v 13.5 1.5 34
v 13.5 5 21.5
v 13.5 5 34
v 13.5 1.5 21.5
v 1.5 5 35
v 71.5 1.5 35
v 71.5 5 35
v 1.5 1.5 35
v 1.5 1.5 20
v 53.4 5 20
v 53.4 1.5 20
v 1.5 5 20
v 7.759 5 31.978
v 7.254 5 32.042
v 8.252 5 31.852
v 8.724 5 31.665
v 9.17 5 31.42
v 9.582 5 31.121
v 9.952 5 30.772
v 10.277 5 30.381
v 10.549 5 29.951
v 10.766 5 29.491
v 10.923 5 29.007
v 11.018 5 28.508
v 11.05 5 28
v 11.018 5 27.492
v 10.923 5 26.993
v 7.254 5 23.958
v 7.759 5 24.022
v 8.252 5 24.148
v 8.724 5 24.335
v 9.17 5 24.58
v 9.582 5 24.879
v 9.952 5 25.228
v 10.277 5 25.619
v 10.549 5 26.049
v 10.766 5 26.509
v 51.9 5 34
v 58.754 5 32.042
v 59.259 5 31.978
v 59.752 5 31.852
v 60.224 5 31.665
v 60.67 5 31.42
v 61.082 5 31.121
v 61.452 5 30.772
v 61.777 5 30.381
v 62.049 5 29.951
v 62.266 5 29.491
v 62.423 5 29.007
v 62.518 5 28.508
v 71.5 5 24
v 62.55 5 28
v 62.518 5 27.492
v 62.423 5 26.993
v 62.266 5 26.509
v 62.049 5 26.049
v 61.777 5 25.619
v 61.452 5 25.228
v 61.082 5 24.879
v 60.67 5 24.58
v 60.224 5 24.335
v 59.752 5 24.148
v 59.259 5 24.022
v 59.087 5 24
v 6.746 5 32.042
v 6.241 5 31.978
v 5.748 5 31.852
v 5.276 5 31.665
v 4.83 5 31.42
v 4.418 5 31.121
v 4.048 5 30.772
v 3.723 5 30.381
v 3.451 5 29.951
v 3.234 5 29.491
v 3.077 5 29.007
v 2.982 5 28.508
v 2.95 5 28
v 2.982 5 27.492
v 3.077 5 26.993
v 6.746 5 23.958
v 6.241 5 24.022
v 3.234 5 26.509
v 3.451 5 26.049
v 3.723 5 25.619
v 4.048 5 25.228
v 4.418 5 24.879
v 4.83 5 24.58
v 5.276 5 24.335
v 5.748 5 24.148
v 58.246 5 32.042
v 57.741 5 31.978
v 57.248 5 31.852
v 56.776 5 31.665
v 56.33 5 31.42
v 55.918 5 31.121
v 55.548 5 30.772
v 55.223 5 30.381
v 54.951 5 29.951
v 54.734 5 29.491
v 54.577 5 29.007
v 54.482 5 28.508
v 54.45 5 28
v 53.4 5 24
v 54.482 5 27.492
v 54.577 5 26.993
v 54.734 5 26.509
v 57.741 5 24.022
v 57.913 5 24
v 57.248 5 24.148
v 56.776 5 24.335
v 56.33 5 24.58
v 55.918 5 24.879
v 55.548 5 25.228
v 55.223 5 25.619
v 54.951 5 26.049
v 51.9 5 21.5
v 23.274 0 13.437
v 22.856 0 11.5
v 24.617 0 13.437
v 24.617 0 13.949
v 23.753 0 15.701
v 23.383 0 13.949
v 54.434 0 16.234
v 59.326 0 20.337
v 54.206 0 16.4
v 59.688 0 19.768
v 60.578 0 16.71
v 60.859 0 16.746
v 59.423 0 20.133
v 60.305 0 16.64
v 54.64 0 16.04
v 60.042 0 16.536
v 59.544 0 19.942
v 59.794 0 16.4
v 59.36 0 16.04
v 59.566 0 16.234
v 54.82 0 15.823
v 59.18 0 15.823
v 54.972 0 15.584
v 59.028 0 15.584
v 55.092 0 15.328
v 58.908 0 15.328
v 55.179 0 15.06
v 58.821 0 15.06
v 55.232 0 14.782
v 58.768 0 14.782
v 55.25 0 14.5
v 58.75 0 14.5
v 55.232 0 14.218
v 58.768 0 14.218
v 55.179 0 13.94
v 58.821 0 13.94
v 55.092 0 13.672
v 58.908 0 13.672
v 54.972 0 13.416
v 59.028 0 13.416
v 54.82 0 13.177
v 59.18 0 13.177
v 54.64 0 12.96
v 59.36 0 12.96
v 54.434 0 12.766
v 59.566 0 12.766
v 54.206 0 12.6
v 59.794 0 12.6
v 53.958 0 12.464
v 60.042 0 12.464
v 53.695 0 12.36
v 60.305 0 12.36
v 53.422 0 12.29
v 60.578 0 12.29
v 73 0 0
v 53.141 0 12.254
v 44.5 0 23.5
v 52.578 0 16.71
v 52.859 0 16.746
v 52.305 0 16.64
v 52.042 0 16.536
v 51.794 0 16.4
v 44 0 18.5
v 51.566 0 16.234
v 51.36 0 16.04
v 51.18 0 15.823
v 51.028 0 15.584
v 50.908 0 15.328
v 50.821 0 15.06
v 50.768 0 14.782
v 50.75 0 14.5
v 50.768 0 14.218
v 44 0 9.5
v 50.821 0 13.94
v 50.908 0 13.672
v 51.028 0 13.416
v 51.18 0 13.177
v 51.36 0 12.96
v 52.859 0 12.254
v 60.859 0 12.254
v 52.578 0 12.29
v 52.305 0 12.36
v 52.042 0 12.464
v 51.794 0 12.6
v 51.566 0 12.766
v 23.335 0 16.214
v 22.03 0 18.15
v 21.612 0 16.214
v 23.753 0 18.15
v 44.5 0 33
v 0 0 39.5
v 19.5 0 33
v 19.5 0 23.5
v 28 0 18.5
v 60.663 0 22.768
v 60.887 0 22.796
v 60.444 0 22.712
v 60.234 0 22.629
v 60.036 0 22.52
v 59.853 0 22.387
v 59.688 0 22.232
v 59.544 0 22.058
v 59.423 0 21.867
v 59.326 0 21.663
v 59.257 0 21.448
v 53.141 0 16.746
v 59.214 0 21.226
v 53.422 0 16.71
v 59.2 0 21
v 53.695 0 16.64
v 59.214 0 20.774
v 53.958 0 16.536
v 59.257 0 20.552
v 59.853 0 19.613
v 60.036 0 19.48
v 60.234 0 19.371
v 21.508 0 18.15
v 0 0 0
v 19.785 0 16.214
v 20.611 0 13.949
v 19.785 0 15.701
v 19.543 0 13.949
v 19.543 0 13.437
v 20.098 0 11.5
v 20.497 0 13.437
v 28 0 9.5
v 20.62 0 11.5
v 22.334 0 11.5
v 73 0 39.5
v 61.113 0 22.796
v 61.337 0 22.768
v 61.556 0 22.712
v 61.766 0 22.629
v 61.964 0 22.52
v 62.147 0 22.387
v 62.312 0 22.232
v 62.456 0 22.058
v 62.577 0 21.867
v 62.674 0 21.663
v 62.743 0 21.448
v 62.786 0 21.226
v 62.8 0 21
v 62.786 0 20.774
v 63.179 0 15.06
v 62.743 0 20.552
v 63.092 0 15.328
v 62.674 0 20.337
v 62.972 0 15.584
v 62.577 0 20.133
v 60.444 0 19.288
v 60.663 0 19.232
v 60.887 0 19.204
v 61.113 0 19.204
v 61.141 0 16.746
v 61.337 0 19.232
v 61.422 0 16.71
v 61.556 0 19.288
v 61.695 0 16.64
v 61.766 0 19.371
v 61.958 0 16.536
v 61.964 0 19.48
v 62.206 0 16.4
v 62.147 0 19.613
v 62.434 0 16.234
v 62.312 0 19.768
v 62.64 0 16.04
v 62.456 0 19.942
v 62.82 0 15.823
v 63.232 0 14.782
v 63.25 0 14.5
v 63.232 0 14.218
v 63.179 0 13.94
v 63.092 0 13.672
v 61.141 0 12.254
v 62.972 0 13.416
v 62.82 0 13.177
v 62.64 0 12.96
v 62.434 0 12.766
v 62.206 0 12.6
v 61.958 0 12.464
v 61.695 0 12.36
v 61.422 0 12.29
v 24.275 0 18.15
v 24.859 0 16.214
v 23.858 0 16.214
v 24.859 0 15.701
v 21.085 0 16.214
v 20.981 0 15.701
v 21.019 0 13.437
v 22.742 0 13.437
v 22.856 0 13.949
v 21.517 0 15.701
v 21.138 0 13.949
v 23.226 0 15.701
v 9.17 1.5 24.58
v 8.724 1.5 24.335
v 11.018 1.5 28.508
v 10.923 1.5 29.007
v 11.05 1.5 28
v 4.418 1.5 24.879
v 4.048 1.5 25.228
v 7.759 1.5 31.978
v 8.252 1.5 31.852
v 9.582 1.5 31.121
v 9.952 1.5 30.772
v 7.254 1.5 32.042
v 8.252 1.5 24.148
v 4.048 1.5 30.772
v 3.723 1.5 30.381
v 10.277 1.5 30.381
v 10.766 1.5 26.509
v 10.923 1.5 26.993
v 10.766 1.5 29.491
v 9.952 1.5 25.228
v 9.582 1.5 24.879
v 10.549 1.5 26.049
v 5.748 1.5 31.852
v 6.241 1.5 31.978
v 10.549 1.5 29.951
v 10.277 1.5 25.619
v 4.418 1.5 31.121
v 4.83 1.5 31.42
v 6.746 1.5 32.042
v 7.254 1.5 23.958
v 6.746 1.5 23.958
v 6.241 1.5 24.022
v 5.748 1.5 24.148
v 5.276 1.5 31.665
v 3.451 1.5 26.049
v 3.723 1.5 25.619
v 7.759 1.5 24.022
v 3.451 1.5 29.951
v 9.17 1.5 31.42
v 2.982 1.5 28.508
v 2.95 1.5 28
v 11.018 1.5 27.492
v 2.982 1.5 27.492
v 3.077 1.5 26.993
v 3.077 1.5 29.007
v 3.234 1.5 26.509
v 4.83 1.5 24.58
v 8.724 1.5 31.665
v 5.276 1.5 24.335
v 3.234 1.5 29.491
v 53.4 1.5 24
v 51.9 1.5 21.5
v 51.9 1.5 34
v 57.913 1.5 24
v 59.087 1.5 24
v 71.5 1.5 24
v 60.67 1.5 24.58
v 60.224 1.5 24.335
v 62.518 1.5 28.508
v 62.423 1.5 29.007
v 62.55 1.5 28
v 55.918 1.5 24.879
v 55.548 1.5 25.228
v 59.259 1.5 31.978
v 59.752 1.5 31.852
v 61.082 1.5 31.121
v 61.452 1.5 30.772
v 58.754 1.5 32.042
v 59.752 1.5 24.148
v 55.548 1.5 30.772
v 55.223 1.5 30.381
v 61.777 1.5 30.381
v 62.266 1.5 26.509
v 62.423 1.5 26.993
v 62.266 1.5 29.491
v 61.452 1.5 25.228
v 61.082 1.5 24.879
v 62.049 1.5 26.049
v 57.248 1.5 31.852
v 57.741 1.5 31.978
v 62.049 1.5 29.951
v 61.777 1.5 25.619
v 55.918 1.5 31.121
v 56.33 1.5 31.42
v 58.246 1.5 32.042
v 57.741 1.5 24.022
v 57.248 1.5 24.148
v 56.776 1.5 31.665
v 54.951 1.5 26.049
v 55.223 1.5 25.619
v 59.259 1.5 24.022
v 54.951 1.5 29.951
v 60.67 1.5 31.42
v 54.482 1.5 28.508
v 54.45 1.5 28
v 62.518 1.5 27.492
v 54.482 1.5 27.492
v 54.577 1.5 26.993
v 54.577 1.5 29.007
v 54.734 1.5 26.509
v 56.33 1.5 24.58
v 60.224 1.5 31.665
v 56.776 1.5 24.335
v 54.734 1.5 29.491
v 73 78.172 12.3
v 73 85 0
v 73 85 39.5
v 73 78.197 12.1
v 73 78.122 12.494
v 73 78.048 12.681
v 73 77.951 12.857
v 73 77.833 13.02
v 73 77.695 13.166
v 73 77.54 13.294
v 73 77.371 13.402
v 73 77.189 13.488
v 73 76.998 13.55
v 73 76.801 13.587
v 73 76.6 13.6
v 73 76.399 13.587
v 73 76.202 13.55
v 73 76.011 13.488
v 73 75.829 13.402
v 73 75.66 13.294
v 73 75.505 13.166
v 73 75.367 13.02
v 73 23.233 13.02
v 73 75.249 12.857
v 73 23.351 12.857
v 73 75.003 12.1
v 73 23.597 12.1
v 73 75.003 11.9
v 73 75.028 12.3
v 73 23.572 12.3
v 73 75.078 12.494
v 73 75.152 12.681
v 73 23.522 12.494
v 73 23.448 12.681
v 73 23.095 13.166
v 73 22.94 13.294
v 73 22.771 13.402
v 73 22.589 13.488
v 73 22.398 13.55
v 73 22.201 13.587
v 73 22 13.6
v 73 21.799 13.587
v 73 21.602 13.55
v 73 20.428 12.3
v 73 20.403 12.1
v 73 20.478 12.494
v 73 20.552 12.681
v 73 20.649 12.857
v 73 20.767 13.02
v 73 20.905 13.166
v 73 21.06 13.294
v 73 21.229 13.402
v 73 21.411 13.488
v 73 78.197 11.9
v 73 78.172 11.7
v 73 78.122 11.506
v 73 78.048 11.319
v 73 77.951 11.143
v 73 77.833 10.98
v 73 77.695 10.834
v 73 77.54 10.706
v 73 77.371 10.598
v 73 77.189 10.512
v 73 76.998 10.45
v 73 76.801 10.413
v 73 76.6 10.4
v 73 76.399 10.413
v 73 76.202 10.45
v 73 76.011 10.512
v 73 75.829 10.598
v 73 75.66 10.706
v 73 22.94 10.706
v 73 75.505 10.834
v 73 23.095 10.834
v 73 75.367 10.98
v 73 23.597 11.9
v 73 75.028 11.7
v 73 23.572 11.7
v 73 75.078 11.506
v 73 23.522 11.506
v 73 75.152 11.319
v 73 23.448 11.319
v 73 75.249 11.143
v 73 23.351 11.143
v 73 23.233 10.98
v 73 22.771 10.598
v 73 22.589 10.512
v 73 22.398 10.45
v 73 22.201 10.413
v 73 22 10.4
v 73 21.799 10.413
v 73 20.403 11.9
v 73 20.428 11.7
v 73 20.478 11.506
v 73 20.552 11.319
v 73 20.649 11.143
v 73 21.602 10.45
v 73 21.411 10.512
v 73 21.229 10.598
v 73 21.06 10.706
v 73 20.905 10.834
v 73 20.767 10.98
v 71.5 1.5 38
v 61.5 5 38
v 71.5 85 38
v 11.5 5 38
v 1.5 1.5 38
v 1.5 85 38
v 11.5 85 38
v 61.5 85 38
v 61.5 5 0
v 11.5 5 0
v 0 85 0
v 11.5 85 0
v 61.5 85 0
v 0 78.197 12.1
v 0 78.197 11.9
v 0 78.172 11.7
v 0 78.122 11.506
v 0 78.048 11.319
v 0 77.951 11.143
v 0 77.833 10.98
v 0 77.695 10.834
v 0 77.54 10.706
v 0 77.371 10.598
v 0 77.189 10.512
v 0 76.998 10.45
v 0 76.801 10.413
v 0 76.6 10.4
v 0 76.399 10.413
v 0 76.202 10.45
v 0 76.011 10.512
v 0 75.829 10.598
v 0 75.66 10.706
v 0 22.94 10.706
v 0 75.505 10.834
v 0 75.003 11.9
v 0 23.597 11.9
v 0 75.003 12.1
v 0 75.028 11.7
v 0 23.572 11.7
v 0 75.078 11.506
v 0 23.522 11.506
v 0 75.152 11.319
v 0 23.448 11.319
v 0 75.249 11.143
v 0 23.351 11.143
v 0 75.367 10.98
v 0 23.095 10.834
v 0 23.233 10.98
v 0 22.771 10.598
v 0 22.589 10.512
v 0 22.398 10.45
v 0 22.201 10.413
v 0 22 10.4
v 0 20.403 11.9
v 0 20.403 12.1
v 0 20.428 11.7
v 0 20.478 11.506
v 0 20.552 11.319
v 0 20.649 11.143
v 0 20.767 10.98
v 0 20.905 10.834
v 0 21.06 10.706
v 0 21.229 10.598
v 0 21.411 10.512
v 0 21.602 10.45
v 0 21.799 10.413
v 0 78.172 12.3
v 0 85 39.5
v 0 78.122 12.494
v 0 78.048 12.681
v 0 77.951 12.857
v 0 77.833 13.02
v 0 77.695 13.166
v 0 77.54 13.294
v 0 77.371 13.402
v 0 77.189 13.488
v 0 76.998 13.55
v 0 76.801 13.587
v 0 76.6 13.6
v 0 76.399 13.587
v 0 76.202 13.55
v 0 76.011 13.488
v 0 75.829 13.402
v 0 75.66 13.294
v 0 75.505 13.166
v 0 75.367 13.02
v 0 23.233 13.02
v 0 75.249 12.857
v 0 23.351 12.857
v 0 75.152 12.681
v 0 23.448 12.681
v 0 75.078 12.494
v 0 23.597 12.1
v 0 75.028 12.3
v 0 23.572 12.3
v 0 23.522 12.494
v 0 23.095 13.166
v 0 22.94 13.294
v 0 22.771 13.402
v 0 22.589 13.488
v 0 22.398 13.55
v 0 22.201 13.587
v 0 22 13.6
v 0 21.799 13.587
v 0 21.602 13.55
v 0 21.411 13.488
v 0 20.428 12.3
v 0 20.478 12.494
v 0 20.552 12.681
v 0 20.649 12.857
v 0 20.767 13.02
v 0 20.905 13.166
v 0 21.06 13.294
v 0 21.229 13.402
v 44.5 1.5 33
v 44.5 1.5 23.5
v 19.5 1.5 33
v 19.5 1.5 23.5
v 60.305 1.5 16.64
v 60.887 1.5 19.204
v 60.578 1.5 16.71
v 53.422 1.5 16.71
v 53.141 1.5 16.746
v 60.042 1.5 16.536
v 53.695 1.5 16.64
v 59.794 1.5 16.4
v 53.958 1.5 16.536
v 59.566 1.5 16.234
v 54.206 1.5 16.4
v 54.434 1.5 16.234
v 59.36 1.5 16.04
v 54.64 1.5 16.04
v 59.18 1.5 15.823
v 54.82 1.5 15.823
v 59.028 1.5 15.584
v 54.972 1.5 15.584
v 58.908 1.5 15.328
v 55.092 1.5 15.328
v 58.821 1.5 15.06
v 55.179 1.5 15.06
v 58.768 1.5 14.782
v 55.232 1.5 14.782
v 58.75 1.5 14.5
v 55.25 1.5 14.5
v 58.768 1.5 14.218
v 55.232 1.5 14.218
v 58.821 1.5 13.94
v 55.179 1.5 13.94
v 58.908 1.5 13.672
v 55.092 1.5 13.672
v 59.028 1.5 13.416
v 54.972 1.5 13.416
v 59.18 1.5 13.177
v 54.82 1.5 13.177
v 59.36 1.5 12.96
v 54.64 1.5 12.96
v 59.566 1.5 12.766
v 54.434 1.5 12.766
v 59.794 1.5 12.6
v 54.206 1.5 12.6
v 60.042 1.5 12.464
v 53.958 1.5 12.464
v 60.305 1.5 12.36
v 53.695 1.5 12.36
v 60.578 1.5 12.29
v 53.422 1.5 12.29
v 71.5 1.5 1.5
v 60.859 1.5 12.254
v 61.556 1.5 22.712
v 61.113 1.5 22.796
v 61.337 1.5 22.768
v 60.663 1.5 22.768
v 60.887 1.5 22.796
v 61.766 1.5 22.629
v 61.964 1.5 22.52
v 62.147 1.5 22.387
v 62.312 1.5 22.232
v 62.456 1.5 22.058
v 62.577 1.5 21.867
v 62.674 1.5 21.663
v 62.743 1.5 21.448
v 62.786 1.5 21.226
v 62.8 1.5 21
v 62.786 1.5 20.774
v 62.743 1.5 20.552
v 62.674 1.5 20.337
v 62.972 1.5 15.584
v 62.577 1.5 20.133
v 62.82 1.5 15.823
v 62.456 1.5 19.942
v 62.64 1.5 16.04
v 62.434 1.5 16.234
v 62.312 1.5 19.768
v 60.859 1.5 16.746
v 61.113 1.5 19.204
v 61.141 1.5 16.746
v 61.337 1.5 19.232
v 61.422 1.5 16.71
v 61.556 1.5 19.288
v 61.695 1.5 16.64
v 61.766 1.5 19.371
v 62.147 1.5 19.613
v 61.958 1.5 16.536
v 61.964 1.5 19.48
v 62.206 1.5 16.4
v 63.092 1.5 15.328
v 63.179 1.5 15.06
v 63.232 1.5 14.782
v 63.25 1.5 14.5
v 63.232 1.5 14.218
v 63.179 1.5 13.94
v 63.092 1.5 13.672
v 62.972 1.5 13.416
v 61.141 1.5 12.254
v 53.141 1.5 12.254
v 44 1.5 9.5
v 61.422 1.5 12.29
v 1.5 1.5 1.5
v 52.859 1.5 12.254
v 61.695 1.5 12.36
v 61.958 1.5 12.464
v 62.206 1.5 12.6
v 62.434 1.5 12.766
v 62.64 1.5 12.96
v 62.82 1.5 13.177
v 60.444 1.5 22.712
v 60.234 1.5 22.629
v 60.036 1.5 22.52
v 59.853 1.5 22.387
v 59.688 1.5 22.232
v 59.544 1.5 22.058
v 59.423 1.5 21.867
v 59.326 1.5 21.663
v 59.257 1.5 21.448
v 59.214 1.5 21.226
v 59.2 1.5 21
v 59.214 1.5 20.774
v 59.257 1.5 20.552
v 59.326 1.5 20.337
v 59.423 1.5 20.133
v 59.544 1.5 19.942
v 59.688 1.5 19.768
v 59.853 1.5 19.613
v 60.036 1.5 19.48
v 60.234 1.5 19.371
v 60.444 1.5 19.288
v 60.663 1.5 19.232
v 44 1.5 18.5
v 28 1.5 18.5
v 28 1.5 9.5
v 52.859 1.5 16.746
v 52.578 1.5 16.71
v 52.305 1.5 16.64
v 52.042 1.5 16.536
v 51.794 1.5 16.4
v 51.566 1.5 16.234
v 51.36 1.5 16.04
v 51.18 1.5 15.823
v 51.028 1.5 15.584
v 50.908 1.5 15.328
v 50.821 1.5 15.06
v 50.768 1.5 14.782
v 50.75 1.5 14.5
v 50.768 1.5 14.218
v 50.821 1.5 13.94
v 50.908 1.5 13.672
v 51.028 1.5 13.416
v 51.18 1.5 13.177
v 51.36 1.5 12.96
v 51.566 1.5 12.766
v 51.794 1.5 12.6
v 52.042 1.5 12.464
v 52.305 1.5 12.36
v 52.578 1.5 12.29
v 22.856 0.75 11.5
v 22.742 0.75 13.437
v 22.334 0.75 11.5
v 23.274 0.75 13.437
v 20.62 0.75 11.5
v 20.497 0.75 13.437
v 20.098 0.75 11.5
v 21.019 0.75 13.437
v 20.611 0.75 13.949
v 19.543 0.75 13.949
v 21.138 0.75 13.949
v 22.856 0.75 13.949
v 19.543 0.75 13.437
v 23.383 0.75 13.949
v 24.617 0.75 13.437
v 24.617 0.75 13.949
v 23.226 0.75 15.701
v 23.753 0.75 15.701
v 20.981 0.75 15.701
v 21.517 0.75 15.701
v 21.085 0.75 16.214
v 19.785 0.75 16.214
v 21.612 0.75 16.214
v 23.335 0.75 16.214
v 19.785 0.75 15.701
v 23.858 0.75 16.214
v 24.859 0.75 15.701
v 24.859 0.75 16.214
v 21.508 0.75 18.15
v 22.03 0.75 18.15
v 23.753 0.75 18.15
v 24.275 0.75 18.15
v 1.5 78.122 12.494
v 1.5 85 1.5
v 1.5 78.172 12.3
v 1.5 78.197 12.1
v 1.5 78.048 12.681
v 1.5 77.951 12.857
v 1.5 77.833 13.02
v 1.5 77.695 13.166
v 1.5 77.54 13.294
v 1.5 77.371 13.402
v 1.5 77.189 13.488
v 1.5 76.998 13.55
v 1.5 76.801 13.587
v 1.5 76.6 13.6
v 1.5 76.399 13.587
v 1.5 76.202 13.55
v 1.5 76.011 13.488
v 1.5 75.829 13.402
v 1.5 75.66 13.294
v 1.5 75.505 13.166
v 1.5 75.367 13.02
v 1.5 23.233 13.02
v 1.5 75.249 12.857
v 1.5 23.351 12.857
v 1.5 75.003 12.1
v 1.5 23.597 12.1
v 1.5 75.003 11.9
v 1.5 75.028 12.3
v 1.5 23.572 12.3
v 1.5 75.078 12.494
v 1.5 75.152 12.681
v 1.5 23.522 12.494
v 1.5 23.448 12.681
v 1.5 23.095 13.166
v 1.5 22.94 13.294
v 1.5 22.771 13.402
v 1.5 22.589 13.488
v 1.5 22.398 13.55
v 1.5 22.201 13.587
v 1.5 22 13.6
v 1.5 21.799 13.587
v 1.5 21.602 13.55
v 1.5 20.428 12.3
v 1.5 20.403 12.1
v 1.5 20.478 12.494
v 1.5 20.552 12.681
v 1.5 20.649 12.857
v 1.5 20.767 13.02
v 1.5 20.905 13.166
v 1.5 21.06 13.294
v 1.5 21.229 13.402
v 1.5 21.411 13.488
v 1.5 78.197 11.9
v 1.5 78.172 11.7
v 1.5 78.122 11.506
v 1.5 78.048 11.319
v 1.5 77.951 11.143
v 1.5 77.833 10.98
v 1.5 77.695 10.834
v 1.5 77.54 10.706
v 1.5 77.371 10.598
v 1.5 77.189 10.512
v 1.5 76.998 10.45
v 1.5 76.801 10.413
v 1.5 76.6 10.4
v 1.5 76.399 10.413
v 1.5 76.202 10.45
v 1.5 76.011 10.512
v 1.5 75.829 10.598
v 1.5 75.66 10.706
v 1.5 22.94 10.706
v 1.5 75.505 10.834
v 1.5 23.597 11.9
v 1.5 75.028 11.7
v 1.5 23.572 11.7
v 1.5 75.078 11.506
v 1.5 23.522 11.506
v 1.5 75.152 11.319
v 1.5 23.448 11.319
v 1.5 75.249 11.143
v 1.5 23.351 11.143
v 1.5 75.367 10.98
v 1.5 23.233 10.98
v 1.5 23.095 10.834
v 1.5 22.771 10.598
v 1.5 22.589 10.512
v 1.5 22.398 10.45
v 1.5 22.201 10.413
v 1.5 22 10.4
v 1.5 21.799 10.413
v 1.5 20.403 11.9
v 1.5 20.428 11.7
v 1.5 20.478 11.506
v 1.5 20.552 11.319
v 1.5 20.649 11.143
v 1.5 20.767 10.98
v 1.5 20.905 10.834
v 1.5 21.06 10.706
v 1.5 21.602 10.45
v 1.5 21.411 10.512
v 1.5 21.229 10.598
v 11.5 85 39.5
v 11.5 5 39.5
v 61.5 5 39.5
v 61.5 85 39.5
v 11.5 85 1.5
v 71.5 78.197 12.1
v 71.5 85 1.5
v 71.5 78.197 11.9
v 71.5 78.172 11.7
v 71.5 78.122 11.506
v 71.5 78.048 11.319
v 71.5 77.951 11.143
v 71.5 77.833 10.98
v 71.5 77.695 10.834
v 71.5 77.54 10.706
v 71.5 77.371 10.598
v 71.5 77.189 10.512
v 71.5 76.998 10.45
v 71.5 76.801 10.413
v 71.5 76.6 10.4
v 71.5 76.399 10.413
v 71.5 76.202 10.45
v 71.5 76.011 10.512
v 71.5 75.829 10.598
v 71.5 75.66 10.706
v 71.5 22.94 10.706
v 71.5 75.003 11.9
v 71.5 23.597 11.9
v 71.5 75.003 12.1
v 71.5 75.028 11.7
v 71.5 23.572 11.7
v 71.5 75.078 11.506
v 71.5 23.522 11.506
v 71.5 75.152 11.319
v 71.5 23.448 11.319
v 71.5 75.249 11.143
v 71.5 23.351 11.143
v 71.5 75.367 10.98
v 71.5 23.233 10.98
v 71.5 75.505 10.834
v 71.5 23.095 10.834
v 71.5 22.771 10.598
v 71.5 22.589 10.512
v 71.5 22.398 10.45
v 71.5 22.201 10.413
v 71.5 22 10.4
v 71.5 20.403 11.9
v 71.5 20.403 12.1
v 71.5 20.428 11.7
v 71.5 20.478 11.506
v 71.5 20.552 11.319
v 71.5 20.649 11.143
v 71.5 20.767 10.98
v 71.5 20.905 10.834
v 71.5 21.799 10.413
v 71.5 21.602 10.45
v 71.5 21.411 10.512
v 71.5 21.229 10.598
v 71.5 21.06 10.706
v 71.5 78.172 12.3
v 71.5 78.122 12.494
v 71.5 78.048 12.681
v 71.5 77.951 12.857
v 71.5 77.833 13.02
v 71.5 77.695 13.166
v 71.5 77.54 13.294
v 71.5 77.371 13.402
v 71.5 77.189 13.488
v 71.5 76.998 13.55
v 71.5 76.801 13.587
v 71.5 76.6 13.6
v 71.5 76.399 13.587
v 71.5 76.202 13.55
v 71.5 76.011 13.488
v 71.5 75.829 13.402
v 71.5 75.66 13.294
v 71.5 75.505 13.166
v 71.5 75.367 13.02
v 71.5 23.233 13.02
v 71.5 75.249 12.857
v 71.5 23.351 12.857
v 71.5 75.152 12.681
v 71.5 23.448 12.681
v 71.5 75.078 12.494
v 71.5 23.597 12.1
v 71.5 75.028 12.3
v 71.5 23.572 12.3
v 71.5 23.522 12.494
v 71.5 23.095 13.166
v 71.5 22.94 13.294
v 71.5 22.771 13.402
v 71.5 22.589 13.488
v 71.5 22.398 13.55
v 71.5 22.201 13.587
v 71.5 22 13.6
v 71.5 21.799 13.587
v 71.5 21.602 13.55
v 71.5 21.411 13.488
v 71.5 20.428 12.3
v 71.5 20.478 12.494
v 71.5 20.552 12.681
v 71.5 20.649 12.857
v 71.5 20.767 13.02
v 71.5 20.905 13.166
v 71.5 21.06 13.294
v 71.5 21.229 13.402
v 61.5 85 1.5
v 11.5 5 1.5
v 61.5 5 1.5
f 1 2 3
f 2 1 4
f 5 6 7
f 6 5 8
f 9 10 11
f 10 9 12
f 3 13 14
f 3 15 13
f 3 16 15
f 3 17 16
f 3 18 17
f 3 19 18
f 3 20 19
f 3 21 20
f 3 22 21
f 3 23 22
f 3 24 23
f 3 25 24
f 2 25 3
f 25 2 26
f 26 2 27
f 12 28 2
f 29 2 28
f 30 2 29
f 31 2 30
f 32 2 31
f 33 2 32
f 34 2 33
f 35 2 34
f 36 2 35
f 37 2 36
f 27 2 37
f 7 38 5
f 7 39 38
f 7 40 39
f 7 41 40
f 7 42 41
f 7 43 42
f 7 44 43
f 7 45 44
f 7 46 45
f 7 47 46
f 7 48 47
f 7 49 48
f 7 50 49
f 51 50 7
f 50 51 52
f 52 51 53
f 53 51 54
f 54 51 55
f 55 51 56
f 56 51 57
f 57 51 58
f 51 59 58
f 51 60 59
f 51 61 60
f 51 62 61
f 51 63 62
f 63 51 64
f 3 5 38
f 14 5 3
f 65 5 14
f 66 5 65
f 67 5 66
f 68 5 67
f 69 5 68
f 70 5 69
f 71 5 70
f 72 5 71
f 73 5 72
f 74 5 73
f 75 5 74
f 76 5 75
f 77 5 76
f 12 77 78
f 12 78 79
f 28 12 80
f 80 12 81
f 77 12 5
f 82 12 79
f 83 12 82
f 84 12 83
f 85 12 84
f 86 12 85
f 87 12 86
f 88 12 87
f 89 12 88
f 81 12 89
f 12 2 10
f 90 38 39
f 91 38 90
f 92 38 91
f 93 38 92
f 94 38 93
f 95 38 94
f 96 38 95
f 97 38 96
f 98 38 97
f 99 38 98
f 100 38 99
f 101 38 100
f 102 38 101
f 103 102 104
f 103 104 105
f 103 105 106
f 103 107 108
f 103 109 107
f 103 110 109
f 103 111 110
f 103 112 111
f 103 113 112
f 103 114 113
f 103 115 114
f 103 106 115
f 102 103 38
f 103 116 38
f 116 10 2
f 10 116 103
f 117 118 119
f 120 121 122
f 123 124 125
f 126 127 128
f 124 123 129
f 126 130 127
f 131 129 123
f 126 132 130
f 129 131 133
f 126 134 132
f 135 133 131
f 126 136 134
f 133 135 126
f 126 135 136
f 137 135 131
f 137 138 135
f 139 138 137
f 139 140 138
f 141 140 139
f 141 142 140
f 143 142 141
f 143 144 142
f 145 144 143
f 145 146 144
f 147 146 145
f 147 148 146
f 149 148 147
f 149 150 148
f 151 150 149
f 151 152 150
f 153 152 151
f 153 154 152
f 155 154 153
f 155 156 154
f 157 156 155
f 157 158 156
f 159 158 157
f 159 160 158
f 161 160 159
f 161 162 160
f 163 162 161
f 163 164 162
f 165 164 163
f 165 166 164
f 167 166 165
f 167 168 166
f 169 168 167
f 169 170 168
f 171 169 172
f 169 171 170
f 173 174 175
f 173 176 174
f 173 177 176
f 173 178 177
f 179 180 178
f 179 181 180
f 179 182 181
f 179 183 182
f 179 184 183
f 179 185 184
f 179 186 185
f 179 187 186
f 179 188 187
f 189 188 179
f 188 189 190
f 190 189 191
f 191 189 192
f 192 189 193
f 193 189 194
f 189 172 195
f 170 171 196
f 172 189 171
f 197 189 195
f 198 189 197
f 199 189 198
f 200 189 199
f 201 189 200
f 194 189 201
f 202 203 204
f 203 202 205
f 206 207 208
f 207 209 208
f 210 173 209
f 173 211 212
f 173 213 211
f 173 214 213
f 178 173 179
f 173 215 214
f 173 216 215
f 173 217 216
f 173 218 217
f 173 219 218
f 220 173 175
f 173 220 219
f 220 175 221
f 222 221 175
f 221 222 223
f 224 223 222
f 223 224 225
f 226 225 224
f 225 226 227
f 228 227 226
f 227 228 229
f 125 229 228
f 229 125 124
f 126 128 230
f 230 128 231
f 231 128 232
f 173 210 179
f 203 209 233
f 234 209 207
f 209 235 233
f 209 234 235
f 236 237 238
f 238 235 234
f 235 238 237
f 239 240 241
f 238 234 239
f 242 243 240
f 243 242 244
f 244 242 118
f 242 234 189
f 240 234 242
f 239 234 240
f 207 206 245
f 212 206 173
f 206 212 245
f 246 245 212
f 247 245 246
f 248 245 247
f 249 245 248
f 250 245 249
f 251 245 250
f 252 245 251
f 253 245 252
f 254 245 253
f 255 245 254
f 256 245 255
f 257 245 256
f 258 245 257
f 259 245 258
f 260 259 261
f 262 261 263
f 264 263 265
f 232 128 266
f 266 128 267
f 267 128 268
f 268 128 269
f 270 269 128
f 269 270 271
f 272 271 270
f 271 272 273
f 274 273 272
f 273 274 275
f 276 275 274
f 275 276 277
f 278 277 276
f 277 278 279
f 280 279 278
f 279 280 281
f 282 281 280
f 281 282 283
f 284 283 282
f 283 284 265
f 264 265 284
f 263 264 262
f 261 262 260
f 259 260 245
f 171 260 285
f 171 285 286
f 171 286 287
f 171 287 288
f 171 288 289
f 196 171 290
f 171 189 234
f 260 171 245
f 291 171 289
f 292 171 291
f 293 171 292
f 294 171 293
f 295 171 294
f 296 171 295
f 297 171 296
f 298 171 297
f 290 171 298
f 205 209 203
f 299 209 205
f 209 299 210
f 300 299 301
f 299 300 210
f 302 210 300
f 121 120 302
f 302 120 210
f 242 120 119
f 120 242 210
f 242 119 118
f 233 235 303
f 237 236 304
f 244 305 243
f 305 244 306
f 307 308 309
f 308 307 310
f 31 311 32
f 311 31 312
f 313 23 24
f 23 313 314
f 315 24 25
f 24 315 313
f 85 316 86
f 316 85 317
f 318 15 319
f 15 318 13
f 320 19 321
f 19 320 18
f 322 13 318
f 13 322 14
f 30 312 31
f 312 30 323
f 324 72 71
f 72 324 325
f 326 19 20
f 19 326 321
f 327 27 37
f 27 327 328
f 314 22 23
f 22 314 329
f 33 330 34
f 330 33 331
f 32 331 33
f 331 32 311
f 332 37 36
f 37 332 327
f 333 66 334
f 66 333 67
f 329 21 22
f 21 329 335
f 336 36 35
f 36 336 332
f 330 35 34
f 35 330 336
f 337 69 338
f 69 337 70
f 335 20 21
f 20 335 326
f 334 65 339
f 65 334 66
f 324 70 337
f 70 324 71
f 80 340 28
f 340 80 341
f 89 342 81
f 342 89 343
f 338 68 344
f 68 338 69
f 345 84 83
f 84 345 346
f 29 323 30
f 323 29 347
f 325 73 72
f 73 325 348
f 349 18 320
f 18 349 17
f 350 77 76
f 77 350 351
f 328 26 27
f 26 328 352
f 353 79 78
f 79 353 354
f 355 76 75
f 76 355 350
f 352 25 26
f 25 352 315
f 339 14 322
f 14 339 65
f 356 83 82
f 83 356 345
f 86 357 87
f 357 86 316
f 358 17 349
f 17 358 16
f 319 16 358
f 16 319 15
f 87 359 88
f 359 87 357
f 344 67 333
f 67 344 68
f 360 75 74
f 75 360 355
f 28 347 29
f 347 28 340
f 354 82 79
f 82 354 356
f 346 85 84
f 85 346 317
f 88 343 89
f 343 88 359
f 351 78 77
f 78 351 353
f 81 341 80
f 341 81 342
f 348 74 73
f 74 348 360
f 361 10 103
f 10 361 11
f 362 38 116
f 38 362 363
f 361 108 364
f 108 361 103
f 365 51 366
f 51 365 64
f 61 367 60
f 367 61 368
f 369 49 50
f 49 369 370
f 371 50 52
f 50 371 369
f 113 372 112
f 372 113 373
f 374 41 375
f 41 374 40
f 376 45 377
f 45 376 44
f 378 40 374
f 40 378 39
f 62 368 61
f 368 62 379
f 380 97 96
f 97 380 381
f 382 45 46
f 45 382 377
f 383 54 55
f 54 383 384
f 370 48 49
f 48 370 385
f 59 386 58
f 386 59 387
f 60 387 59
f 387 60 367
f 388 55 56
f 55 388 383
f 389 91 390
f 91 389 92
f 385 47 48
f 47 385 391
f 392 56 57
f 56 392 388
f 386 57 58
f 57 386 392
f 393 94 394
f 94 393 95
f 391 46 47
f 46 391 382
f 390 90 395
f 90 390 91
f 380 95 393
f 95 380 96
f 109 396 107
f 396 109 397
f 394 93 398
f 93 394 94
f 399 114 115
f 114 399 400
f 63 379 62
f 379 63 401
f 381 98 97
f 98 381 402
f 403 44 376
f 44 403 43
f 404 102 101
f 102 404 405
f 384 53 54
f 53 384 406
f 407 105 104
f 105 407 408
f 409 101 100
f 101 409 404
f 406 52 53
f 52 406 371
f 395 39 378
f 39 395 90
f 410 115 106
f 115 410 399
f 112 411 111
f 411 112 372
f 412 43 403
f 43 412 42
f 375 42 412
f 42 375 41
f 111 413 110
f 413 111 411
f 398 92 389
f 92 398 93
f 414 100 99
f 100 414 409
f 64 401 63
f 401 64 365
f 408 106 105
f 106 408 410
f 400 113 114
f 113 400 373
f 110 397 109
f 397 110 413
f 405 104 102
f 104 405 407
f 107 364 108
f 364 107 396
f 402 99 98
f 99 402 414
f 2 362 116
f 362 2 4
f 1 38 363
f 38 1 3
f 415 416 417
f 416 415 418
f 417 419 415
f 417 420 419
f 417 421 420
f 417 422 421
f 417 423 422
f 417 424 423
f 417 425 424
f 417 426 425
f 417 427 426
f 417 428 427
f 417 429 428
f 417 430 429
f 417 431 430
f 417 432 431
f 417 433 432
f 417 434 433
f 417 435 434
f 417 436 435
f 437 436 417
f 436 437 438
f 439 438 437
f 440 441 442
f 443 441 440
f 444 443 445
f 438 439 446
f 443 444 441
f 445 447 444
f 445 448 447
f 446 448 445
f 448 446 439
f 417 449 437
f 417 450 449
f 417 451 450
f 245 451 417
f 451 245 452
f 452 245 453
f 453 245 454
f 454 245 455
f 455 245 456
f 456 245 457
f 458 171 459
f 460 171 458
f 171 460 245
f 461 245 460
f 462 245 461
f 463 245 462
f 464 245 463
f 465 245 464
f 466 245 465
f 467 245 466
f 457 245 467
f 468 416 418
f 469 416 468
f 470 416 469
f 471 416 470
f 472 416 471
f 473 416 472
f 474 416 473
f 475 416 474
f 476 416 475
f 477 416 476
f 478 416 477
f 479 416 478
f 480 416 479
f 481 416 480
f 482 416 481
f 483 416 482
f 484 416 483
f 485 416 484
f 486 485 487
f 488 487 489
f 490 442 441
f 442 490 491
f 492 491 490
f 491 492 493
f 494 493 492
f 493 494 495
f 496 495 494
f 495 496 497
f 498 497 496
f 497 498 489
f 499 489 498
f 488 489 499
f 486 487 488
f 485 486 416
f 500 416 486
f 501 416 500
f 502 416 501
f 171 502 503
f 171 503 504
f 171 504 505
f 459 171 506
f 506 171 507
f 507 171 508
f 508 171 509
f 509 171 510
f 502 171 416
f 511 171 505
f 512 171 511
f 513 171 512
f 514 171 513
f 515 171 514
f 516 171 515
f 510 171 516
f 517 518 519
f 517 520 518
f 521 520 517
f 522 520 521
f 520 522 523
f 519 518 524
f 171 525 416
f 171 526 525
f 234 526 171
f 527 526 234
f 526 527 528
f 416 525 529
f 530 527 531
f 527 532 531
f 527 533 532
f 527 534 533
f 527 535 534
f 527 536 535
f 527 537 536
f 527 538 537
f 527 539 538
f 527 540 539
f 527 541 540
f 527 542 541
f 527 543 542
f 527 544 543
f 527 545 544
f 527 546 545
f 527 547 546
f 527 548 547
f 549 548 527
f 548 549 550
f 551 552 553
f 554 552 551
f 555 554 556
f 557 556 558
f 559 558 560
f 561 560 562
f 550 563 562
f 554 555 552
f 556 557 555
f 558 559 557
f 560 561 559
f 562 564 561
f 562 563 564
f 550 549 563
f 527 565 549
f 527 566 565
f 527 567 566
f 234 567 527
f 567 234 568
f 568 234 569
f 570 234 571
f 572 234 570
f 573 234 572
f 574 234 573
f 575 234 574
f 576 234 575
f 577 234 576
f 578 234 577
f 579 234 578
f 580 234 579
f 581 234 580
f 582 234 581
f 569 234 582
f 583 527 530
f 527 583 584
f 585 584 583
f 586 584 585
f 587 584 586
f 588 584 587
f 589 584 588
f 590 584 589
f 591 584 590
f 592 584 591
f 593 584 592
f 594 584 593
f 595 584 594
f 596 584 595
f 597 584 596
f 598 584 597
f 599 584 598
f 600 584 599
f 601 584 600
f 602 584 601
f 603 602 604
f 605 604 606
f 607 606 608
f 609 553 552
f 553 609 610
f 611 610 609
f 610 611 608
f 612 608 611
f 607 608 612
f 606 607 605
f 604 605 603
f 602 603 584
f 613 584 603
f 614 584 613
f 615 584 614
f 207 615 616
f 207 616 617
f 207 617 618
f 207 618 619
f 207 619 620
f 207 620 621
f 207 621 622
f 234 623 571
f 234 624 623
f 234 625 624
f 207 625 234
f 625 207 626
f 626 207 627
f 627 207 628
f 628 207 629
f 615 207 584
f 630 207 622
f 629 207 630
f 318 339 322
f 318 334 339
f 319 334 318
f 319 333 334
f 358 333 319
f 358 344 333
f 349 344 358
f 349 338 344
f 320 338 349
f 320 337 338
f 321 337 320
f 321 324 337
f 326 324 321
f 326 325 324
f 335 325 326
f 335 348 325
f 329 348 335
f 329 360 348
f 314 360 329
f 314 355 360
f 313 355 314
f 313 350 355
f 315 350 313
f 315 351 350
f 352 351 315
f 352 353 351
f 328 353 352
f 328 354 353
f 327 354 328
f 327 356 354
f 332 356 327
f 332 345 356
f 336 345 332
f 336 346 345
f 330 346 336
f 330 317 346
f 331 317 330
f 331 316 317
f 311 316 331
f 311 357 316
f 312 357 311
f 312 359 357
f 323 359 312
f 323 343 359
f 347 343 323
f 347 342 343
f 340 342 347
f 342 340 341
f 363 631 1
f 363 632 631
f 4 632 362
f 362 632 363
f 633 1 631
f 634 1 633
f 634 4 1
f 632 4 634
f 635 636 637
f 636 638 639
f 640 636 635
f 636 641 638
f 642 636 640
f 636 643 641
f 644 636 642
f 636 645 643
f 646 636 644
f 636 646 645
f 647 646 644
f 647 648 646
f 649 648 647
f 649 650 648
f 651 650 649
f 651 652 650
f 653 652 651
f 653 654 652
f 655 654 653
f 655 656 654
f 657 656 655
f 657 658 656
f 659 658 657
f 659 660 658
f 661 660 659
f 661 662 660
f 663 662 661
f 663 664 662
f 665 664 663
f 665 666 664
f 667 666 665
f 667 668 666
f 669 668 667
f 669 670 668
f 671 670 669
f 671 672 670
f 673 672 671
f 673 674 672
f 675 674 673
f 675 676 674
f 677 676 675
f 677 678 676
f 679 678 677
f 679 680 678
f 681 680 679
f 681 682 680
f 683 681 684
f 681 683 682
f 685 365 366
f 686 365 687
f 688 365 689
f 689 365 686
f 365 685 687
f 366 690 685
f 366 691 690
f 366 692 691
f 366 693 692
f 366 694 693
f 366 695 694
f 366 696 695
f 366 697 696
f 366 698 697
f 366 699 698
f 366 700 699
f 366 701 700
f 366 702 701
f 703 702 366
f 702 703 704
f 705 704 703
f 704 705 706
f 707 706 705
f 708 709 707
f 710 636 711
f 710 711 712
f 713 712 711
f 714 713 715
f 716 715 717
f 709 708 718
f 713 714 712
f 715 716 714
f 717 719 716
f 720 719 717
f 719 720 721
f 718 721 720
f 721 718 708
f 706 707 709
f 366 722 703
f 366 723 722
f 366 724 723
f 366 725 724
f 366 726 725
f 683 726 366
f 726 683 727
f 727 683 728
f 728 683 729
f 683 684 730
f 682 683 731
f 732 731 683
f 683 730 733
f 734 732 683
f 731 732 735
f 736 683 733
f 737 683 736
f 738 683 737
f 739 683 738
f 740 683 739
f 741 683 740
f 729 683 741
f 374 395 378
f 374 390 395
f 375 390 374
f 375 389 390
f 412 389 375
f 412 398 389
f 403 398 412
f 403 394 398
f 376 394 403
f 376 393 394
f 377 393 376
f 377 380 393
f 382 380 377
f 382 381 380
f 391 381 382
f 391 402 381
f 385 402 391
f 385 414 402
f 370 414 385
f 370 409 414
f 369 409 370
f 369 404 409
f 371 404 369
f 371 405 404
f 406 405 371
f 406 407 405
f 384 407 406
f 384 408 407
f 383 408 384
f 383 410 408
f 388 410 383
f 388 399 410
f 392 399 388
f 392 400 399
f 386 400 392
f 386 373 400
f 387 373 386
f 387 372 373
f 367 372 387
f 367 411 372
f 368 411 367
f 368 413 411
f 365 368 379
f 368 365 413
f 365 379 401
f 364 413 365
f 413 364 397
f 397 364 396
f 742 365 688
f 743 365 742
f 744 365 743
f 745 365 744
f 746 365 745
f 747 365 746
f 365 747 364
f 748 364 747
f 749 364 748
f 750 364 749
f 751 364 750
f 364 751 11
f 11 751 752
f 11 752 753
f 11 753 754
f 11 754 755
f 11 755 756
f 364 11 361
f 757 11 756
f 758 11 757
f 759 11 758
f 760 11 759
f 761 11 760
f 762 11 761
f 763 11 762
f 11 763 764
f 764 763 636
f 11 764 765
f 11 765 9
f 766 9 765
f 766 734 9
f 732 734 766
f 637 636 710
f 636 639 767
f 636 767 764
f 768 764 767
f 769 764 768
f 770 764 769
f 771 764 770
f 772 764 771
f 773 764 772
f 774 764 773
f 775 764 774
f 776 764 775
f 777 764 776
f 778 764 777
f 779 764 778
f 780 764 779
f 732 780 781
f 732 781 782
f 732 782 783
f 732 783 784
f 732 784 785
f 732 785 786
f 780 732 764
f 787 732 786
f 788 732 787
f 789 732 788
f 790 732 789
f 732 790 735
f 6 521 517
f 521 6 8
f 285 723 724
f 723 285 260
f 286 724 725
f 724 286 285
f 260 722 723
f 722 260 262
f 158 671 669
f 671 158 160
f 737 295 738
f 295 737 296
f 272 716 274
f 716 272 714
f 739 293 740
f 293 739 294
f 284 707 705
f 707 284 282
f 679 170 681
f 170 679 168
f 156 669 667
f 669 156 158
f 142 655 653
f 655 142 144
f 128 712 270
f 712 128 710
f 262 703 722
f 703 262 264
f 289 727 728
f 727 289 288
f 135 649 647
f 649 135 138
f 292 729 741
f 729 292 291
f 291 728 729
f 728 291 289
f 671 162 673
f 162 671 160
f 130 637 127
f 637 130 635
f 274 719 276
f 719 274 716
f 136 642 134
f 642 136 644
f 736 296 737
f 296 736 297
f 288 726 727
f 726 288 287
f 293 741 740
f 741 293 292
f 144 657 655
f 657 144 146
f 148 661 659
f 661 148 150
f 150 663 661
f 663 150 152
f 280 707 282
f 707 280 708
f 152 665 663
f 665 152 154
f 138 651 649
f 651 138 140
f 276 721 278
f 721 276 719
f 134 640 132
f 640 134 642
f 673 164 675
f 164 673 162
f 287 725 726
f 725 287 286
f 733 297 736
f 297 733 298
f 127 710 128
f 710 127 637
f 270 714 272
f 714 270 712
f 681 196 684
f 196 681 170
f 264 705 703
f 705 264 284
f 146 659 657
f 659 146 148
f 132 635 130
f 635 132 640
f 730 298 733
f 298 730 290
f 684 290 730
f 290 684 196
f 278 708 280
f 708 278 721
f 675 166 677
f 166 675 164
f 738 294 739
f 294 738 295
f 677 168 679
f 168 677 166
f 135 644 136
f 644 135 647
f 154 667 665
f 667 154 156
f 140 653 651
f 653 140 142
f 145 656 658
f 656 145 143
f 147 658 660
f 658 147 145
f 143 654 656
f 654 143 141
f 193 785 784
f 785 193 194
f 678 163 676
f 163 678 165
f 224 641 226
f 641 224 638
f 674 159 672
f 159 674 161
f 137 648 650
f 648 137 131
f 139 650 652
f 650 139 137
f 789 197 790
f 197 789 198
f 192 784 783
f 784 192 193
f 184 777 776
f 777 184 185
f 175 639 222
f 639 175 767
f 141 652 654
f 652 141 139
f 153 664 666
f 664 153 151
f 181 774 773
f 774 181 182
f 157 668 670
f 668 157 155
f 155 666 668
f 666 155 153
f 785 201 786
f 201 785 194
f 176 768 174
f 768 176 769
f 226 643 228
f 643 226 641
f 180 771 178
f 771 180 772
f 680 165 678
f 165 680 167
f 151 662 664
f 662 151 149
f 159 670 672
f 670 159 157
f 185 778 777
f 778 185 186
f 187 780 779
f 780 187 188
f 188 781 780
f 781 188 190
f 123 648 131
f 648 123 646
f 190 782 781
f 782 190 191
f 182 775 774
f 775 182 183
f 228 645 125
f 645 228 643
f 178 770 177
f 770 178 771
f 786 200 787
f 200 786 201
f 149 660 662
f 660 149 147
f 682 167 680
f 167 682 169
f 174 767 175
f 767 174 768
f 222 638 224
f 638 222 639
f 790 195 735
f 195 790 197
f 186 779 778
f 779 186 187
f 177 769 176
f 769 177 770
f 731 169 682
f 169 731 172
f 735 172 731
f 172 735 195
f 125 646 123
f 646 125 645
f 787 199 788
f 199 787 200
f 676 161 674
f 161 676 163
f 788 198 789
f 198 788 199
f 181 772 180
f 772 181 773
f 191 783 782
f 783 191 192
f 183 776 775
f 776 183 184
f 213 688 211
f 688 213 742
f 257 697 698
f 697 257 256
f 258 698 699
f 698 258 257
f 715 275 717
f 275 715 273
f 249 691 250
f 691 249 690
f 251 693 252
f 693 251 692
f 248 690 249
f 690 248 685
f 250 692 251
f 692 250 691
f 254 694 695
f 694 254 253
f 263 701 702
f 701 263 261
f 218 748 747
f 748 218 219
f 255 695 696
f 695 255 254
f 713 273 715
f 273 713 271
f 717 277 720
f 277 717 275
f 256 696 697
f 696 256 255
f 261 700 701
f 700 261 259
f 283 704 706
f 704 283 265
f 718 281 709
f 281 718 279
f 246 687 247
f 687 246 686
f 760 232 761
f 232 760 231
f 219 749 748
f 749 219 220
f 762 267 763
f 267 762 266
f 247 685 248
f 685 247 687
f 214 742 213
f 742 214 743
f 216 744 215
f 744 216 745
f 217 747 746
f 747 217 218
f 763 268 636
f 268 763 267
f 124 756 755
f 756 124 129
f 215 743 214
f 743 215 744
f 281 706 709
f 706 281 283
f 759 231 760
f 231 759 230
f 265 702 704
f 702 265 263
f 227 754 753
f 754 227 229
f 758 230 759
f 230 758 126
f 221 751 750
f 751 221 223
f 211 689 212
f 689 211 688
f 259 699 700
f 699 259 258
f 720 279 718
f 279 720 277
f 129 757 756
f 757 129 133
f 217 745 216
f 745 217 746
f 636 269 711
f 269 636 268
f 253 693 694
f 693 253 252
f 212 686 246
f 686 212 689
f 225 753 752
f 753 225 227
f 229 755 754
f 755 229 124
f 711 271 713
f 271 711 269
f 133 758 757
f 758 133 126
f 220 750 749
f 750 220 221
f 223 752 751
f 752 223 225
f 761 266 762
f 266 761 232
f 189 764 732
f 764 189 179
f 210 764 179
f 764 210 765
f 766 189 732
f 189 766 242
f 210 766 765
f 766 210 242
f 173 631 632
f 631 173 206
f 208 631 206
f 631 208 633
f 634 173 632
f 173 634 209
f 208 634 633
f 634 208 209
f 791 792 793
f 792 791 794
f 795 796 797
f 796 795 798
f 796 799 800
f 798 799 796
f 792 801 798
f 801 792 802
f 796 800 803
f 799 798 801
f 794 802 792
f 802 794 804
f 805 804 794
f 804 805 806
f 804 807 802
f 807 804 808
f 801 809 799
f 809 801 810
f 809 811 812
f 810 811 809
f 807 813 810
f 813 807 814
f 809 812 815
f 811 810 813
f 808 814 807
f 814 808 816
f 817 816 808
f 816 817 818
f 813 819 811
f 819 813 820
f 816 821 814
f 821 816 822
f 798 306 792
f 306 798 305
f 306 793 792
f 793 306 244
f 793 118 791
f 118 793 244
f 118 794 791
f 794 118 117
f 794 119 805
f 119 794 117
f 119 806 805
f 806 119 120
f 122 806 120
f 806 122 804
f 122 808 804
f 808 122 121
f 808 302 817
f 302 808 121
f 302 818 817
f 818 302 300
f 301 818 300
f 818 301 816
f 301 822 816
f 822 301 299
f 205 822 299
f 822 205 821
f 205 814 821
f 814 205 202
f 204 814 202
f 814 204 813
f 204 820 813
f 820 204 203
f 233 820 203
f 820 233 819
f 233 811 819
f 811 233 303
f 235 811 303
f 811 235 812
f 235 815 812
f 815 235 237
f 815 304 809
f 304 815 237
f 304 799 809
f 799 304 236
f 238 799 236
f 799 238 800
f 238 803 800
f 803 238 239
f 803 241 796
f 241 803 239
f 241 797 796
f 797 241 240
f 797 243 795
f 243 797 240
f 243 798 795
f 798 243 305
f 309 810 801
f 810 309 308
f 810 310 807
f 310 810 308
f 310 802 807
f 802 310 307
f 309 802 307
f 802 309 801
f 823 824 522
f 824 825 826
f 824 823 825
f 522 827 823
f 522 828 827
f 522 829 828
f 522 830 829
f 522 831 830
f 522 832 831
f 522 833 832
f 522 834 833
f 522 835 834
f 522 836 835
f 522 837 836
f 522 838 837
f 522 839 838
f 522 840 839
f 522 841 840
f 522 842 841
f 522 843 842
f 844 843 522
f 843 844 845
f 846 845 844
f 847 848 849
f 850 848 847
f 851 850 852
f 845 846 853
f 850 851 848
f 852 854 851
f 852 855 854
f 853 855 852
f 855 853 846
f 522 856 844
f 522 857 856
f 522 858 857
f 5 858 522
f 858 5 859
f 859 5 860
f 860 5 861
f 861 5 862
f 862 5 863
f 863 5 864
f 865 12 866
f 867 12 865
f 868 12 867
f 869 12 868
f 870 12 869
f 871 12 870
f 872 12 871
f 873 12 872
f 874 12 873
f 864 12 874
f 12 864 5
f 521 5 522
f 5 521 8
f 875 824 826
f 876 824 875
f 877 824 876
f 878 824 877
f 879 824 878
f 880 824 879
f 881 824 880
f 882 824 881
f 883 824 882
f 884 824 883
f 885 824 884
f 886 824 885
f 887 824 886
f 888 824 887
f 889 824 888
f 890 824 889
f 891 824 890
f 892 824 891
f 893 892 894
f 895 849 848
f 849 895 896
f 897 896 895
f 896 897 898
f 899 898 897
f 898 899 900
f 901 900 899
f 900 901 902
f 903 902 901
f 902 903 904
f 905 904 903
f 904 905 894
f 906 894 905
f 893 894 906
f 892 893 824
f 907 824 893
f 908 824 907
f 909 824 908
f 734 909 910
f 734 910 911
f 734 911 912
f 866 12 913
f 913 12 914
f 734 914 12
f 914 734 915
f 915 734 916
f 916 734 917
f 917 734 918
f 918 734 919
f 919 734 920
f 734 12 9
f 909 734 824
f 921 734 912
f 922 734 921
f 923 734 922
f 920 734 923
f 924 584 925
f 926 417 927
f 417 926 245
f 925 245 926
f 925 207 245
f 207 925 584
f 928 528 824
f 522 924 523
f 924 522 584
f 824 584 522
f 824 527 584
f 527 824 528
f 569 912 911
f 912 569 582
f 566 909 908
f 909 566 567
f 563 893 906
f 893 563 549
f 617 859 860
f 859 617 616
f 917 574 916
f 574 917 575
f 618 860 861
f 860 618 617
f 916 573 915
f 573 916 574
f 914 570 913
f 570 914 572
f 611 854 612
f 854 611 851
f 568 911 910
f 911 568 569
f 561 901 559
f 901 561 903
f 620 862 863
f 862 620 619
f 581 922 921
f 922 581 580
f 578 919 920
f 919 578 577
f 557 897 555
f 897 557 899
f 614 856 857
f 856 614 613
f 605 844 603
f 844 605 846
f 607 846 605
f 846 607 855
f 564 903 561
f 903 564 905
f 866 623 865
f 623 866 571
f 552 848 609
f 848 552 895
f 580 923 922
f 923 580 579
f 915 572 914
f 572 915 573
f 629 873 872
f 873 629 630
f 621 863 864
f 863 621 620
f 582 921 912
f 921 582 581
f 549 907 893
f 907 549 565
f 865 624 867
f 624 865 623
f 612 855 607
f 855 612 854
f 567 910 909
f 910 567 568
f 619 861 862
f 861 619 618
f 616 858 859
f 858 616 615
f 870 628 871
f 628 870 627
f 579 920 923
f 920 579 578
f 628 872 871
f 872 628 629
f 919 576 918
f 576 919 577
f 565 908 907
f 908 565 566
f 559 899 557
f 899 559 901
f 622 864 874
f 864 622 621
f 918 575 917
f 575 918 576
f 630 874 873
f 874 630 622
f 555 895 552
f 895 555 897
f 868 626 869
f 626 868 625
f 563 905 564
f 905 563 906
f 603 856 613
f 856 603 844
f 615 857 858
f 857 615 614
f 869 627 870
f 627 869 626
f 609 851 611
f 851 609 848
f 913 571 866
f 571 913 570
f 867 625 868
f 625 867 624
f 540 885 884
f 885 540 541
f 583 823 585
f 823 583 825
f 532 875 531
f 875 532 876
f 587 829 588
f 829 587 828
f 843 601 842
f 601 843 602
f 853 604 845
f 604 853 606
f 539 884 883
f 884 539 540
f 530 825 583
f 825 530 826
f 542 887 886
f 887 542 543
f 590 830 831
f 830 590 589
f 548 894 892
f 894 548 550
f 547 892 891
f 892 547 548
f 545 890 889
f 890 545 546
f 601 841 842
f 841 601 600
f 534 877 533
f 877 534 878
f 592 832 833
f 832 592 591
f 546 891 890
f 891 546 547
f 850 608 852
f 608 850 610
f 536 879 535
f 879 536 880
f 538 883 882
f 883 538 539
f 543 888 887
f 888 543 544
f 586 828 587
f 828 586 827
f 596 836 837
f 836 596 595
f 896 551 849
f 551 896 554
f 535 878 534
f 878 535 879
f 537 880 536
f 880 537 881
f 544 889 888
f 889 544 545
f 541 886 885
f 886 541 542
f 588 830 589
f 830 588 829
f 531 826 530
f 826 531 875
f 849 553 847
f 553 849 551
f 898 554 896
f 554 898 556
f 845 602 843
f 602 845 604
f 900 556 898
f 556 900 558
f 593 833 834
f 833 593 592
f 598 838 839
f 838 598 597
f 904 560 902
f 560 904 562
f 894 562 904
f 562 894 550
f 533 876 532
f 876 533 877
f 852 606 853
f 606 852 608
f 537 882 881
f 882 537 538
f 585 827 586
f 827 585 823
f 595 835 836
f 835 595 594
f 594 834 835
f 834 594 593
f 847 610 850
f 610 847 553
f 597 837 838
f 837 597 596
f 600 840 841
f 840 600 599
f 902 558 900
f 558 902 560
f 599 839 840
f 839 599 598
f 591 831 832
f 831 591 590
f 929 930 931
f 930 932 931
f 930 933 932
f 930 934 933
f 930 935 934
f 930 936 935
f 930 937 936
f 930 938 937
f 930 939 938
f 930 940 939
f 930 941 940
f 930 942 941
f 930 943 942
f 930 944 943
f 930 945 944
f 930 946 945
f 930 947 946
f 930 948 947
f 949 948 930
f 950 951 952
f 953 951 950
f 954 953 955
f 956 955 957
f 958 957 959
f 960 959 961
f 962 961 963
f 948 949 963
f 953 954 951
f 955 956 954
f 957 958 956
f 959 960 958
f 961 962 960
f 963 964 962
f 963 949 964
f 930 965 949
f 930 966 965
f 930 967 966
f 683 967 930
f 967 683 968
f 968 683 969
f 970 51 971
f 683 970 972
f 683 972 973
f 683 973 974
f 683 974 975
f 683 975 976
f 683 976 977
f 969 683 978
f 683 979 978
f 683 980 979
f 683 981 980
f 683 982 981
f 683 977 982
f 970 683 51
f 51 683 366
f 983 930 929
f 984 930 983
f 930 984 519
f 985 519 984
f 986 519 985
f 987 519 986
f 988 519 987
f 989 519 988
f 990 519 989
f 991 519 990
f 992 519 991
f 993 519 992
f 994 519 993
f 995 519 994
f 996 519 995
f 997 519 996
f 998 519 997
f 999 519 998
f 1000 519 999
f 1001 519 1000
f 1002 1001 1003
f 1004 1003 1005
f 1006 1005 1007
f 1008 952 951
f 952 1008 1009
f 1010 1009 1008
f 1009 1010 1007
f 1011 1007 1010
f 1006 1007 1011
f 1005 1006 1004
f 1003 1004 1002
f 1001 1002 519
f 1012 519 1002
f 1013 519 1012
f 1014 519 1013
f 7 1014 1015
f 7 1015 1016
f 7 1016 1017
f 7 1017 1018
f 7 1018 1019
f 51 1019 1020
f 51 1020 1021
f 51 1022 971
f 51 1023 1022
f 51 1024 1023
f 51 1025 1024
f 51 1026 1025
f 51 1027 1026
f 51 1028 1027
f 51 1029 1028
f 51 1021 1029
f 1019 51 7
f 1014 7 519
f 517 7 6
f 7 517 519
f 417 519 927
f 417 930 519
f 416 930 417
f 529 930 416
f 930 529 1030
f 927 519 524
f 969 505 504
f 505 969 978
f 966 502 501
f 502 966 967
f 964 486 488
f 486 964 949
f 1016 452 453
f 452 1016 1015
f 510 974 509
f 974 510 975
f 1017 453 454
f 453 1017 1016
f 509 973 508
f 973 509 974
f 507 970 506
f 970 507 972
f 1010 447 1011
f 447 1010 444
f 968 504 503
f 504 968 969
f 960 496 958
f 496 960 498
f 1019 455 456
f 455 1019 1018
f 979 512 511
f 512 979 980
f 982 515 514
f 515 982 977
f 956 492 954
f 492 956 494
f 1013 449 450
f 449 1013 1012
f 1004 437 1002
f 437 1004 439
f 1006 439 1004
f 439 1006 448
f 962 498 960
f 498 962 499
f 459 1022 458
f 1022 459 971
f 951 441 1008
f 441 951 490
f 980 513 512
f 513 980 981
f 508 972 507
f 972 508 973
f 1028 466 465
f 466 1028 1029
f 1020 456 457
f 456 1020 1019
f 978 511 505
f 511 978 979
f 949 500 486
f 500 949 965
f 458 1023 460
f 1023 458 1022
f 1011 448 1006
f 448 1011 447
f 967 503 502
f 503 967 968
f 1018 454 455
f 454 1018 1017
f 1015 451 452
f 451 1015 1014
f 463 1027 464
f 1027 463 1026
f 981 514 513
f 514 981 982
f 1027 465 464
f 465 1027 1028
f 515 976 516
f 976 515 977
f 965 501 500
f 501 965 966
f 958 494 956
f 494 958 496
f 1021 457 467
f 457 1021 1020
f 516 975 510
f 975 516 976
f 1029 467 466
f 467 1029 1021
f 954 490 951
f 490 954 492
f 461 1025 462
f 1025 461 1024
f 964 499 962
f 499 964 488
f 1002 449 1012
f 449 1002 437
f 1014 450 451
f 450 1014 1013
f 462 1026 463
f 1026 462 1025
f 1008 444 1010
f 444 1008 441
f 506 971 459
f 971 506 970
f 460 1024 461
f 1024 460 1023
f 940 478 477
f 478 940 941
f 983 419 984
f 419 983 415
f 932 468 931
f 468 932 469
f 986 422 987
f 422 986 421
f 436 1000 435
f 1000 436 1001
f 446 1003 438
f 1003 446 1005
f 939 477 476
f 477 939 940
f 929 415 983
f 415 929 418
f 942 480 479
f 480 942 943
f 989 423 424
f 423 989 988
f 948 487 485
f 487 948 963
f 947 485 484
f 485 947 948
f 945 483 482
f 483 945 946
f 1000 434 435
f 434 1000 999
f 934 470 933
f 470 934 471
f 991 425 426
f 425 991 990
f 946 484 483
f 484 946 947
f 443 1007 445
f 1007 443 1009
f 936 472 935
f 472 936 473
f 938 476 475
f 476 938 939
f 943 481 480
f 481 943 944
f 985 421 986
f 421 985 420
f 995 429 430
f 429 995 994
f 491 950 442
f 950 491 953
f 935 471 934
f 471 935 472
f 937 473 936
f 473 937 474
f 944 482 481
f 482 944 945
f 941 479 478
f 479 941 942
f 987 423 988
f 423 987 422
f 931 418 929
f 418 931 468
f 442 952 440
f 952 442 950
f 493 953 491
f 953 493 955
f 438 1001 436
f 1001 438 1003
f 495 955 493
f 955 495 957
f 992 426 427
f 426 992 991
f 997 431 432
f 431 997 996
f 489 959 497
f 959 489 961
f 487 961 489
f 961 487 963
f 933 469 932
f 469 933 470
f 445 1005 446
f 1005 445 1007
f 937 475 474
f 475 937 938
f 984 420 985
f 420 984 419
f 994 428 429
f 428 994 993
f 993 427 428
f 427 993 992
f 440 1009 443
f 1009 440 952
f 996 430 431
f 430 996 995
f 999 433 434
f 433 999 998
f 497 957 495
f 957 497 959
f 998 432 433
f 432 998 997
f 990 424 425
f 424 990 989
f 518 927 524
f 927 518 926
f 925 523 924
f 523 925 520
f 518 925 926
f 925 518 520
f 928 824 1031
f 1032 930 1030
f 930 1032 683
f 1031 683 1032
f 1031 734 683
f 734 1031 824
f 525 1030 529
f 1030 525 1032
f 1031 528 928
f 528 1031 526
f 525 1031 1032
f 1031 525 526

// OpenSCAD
// A template of a single Gotek drive slot -- include in other designs.
$fa = 1;
$fs = 0.5;
$fn = 50;

tw = 1.5; // thickness of walls
gotek_height = 38;
gotek_width = 73;
gotek_depth = 85;

module gotek() {
  gotek_faceplate();
  translate([(gotek_width-70)/2-tw,0,0])          gotek_side(); // left from front
  translate([gotek_width-(gotek_width-70)/2,0,0]) gotek_side(); // right from front
  translate([(gotek_width-70)/2,0, gotek_height]) gotek_floor(); // top
  translate([(gotek_width-70)/2,0,0])             gotek_floor(); // bottom
}


module gotek_faceplate() {
  gotek_button_radius = 2.25;
  magnet_hole_radius = 4.05;
  led_radius = 1.8;
  difference() {
    union() {
      // faceplate
      cube([gotek_width,tw,gotek_height]);
      translate([(gotek_width-70)/2,0,0]) {
        translate([18-6,0,20]) cube([39,5,tw]);
        translate([18-6,0,20+12.5+tw]) cube([39,5,1]);
        translate([18-6-tw-11,0,20]) difference() {
          cube([tw+11,5,12+2*tw]);
          translate([6,6,8]) rotate([90,0,0]) cylinder(h=5,r=magnet_hole_radius);
        }
        translate([18-6+39,0,20]) difference() {
          union() {
            translate([-0.6,0,0]) cube([tw,5,12+2*tw]);
            translate([0,0,4]) cube([20,5,11]);
          }
          translate([6,6,8]) rotate([90,0,0]) cylinder(h=5,r=magnet_hole_radius);
        }
      }
    }
    // cutouts
    translate([(gotek_width - 70)/2, 0, 0]) {
      translate ([59.5,tw+1,14.5]) rotate([90,0,0]) cylinder(h=tw*2,r=gotek_button_radius);
      translate ([51.5,tw+1,14.5]) rotate([90,0,0]) cylinder(h=tw*2,r=gotek_button_radius);
      translate ([59.5,tw+1,21]) rotate([90,0,0])   cylinder(h=tw*2,r=led_radius);
      translate ([26.5,-1,9.5]) cube([16,tw*2,9]);  // usb slot
      translate ([18,-1,23.5]) cube([25,tw*2,9.5]); // oled slot
      translate ([18,0.75,11.5]) rotate([90, 0, 0]) linear_extrude(2*tw) text("#", size=7);
    }
  }
}

module gotek_side() {
    difference() {
    cube([tw,gotek_depth,gotek_height+tw]);
    // screw holes
    translate ([-1,22,10.5+tw]) rotate([0,90,0])   cylinder(h=tw*2,r=1.6);
    translate ([-1,76.6,10.5+tw]) rotate([0,90,0]) cylinder(h=tw*2,r=1.6);
  }
}

module gotek_floor() {
  difference() {
    cube([70,gotek_depth,tw]);
    translate([10,5,-1]) cube([50,95,2*tw]);
  }
}





gotek();
